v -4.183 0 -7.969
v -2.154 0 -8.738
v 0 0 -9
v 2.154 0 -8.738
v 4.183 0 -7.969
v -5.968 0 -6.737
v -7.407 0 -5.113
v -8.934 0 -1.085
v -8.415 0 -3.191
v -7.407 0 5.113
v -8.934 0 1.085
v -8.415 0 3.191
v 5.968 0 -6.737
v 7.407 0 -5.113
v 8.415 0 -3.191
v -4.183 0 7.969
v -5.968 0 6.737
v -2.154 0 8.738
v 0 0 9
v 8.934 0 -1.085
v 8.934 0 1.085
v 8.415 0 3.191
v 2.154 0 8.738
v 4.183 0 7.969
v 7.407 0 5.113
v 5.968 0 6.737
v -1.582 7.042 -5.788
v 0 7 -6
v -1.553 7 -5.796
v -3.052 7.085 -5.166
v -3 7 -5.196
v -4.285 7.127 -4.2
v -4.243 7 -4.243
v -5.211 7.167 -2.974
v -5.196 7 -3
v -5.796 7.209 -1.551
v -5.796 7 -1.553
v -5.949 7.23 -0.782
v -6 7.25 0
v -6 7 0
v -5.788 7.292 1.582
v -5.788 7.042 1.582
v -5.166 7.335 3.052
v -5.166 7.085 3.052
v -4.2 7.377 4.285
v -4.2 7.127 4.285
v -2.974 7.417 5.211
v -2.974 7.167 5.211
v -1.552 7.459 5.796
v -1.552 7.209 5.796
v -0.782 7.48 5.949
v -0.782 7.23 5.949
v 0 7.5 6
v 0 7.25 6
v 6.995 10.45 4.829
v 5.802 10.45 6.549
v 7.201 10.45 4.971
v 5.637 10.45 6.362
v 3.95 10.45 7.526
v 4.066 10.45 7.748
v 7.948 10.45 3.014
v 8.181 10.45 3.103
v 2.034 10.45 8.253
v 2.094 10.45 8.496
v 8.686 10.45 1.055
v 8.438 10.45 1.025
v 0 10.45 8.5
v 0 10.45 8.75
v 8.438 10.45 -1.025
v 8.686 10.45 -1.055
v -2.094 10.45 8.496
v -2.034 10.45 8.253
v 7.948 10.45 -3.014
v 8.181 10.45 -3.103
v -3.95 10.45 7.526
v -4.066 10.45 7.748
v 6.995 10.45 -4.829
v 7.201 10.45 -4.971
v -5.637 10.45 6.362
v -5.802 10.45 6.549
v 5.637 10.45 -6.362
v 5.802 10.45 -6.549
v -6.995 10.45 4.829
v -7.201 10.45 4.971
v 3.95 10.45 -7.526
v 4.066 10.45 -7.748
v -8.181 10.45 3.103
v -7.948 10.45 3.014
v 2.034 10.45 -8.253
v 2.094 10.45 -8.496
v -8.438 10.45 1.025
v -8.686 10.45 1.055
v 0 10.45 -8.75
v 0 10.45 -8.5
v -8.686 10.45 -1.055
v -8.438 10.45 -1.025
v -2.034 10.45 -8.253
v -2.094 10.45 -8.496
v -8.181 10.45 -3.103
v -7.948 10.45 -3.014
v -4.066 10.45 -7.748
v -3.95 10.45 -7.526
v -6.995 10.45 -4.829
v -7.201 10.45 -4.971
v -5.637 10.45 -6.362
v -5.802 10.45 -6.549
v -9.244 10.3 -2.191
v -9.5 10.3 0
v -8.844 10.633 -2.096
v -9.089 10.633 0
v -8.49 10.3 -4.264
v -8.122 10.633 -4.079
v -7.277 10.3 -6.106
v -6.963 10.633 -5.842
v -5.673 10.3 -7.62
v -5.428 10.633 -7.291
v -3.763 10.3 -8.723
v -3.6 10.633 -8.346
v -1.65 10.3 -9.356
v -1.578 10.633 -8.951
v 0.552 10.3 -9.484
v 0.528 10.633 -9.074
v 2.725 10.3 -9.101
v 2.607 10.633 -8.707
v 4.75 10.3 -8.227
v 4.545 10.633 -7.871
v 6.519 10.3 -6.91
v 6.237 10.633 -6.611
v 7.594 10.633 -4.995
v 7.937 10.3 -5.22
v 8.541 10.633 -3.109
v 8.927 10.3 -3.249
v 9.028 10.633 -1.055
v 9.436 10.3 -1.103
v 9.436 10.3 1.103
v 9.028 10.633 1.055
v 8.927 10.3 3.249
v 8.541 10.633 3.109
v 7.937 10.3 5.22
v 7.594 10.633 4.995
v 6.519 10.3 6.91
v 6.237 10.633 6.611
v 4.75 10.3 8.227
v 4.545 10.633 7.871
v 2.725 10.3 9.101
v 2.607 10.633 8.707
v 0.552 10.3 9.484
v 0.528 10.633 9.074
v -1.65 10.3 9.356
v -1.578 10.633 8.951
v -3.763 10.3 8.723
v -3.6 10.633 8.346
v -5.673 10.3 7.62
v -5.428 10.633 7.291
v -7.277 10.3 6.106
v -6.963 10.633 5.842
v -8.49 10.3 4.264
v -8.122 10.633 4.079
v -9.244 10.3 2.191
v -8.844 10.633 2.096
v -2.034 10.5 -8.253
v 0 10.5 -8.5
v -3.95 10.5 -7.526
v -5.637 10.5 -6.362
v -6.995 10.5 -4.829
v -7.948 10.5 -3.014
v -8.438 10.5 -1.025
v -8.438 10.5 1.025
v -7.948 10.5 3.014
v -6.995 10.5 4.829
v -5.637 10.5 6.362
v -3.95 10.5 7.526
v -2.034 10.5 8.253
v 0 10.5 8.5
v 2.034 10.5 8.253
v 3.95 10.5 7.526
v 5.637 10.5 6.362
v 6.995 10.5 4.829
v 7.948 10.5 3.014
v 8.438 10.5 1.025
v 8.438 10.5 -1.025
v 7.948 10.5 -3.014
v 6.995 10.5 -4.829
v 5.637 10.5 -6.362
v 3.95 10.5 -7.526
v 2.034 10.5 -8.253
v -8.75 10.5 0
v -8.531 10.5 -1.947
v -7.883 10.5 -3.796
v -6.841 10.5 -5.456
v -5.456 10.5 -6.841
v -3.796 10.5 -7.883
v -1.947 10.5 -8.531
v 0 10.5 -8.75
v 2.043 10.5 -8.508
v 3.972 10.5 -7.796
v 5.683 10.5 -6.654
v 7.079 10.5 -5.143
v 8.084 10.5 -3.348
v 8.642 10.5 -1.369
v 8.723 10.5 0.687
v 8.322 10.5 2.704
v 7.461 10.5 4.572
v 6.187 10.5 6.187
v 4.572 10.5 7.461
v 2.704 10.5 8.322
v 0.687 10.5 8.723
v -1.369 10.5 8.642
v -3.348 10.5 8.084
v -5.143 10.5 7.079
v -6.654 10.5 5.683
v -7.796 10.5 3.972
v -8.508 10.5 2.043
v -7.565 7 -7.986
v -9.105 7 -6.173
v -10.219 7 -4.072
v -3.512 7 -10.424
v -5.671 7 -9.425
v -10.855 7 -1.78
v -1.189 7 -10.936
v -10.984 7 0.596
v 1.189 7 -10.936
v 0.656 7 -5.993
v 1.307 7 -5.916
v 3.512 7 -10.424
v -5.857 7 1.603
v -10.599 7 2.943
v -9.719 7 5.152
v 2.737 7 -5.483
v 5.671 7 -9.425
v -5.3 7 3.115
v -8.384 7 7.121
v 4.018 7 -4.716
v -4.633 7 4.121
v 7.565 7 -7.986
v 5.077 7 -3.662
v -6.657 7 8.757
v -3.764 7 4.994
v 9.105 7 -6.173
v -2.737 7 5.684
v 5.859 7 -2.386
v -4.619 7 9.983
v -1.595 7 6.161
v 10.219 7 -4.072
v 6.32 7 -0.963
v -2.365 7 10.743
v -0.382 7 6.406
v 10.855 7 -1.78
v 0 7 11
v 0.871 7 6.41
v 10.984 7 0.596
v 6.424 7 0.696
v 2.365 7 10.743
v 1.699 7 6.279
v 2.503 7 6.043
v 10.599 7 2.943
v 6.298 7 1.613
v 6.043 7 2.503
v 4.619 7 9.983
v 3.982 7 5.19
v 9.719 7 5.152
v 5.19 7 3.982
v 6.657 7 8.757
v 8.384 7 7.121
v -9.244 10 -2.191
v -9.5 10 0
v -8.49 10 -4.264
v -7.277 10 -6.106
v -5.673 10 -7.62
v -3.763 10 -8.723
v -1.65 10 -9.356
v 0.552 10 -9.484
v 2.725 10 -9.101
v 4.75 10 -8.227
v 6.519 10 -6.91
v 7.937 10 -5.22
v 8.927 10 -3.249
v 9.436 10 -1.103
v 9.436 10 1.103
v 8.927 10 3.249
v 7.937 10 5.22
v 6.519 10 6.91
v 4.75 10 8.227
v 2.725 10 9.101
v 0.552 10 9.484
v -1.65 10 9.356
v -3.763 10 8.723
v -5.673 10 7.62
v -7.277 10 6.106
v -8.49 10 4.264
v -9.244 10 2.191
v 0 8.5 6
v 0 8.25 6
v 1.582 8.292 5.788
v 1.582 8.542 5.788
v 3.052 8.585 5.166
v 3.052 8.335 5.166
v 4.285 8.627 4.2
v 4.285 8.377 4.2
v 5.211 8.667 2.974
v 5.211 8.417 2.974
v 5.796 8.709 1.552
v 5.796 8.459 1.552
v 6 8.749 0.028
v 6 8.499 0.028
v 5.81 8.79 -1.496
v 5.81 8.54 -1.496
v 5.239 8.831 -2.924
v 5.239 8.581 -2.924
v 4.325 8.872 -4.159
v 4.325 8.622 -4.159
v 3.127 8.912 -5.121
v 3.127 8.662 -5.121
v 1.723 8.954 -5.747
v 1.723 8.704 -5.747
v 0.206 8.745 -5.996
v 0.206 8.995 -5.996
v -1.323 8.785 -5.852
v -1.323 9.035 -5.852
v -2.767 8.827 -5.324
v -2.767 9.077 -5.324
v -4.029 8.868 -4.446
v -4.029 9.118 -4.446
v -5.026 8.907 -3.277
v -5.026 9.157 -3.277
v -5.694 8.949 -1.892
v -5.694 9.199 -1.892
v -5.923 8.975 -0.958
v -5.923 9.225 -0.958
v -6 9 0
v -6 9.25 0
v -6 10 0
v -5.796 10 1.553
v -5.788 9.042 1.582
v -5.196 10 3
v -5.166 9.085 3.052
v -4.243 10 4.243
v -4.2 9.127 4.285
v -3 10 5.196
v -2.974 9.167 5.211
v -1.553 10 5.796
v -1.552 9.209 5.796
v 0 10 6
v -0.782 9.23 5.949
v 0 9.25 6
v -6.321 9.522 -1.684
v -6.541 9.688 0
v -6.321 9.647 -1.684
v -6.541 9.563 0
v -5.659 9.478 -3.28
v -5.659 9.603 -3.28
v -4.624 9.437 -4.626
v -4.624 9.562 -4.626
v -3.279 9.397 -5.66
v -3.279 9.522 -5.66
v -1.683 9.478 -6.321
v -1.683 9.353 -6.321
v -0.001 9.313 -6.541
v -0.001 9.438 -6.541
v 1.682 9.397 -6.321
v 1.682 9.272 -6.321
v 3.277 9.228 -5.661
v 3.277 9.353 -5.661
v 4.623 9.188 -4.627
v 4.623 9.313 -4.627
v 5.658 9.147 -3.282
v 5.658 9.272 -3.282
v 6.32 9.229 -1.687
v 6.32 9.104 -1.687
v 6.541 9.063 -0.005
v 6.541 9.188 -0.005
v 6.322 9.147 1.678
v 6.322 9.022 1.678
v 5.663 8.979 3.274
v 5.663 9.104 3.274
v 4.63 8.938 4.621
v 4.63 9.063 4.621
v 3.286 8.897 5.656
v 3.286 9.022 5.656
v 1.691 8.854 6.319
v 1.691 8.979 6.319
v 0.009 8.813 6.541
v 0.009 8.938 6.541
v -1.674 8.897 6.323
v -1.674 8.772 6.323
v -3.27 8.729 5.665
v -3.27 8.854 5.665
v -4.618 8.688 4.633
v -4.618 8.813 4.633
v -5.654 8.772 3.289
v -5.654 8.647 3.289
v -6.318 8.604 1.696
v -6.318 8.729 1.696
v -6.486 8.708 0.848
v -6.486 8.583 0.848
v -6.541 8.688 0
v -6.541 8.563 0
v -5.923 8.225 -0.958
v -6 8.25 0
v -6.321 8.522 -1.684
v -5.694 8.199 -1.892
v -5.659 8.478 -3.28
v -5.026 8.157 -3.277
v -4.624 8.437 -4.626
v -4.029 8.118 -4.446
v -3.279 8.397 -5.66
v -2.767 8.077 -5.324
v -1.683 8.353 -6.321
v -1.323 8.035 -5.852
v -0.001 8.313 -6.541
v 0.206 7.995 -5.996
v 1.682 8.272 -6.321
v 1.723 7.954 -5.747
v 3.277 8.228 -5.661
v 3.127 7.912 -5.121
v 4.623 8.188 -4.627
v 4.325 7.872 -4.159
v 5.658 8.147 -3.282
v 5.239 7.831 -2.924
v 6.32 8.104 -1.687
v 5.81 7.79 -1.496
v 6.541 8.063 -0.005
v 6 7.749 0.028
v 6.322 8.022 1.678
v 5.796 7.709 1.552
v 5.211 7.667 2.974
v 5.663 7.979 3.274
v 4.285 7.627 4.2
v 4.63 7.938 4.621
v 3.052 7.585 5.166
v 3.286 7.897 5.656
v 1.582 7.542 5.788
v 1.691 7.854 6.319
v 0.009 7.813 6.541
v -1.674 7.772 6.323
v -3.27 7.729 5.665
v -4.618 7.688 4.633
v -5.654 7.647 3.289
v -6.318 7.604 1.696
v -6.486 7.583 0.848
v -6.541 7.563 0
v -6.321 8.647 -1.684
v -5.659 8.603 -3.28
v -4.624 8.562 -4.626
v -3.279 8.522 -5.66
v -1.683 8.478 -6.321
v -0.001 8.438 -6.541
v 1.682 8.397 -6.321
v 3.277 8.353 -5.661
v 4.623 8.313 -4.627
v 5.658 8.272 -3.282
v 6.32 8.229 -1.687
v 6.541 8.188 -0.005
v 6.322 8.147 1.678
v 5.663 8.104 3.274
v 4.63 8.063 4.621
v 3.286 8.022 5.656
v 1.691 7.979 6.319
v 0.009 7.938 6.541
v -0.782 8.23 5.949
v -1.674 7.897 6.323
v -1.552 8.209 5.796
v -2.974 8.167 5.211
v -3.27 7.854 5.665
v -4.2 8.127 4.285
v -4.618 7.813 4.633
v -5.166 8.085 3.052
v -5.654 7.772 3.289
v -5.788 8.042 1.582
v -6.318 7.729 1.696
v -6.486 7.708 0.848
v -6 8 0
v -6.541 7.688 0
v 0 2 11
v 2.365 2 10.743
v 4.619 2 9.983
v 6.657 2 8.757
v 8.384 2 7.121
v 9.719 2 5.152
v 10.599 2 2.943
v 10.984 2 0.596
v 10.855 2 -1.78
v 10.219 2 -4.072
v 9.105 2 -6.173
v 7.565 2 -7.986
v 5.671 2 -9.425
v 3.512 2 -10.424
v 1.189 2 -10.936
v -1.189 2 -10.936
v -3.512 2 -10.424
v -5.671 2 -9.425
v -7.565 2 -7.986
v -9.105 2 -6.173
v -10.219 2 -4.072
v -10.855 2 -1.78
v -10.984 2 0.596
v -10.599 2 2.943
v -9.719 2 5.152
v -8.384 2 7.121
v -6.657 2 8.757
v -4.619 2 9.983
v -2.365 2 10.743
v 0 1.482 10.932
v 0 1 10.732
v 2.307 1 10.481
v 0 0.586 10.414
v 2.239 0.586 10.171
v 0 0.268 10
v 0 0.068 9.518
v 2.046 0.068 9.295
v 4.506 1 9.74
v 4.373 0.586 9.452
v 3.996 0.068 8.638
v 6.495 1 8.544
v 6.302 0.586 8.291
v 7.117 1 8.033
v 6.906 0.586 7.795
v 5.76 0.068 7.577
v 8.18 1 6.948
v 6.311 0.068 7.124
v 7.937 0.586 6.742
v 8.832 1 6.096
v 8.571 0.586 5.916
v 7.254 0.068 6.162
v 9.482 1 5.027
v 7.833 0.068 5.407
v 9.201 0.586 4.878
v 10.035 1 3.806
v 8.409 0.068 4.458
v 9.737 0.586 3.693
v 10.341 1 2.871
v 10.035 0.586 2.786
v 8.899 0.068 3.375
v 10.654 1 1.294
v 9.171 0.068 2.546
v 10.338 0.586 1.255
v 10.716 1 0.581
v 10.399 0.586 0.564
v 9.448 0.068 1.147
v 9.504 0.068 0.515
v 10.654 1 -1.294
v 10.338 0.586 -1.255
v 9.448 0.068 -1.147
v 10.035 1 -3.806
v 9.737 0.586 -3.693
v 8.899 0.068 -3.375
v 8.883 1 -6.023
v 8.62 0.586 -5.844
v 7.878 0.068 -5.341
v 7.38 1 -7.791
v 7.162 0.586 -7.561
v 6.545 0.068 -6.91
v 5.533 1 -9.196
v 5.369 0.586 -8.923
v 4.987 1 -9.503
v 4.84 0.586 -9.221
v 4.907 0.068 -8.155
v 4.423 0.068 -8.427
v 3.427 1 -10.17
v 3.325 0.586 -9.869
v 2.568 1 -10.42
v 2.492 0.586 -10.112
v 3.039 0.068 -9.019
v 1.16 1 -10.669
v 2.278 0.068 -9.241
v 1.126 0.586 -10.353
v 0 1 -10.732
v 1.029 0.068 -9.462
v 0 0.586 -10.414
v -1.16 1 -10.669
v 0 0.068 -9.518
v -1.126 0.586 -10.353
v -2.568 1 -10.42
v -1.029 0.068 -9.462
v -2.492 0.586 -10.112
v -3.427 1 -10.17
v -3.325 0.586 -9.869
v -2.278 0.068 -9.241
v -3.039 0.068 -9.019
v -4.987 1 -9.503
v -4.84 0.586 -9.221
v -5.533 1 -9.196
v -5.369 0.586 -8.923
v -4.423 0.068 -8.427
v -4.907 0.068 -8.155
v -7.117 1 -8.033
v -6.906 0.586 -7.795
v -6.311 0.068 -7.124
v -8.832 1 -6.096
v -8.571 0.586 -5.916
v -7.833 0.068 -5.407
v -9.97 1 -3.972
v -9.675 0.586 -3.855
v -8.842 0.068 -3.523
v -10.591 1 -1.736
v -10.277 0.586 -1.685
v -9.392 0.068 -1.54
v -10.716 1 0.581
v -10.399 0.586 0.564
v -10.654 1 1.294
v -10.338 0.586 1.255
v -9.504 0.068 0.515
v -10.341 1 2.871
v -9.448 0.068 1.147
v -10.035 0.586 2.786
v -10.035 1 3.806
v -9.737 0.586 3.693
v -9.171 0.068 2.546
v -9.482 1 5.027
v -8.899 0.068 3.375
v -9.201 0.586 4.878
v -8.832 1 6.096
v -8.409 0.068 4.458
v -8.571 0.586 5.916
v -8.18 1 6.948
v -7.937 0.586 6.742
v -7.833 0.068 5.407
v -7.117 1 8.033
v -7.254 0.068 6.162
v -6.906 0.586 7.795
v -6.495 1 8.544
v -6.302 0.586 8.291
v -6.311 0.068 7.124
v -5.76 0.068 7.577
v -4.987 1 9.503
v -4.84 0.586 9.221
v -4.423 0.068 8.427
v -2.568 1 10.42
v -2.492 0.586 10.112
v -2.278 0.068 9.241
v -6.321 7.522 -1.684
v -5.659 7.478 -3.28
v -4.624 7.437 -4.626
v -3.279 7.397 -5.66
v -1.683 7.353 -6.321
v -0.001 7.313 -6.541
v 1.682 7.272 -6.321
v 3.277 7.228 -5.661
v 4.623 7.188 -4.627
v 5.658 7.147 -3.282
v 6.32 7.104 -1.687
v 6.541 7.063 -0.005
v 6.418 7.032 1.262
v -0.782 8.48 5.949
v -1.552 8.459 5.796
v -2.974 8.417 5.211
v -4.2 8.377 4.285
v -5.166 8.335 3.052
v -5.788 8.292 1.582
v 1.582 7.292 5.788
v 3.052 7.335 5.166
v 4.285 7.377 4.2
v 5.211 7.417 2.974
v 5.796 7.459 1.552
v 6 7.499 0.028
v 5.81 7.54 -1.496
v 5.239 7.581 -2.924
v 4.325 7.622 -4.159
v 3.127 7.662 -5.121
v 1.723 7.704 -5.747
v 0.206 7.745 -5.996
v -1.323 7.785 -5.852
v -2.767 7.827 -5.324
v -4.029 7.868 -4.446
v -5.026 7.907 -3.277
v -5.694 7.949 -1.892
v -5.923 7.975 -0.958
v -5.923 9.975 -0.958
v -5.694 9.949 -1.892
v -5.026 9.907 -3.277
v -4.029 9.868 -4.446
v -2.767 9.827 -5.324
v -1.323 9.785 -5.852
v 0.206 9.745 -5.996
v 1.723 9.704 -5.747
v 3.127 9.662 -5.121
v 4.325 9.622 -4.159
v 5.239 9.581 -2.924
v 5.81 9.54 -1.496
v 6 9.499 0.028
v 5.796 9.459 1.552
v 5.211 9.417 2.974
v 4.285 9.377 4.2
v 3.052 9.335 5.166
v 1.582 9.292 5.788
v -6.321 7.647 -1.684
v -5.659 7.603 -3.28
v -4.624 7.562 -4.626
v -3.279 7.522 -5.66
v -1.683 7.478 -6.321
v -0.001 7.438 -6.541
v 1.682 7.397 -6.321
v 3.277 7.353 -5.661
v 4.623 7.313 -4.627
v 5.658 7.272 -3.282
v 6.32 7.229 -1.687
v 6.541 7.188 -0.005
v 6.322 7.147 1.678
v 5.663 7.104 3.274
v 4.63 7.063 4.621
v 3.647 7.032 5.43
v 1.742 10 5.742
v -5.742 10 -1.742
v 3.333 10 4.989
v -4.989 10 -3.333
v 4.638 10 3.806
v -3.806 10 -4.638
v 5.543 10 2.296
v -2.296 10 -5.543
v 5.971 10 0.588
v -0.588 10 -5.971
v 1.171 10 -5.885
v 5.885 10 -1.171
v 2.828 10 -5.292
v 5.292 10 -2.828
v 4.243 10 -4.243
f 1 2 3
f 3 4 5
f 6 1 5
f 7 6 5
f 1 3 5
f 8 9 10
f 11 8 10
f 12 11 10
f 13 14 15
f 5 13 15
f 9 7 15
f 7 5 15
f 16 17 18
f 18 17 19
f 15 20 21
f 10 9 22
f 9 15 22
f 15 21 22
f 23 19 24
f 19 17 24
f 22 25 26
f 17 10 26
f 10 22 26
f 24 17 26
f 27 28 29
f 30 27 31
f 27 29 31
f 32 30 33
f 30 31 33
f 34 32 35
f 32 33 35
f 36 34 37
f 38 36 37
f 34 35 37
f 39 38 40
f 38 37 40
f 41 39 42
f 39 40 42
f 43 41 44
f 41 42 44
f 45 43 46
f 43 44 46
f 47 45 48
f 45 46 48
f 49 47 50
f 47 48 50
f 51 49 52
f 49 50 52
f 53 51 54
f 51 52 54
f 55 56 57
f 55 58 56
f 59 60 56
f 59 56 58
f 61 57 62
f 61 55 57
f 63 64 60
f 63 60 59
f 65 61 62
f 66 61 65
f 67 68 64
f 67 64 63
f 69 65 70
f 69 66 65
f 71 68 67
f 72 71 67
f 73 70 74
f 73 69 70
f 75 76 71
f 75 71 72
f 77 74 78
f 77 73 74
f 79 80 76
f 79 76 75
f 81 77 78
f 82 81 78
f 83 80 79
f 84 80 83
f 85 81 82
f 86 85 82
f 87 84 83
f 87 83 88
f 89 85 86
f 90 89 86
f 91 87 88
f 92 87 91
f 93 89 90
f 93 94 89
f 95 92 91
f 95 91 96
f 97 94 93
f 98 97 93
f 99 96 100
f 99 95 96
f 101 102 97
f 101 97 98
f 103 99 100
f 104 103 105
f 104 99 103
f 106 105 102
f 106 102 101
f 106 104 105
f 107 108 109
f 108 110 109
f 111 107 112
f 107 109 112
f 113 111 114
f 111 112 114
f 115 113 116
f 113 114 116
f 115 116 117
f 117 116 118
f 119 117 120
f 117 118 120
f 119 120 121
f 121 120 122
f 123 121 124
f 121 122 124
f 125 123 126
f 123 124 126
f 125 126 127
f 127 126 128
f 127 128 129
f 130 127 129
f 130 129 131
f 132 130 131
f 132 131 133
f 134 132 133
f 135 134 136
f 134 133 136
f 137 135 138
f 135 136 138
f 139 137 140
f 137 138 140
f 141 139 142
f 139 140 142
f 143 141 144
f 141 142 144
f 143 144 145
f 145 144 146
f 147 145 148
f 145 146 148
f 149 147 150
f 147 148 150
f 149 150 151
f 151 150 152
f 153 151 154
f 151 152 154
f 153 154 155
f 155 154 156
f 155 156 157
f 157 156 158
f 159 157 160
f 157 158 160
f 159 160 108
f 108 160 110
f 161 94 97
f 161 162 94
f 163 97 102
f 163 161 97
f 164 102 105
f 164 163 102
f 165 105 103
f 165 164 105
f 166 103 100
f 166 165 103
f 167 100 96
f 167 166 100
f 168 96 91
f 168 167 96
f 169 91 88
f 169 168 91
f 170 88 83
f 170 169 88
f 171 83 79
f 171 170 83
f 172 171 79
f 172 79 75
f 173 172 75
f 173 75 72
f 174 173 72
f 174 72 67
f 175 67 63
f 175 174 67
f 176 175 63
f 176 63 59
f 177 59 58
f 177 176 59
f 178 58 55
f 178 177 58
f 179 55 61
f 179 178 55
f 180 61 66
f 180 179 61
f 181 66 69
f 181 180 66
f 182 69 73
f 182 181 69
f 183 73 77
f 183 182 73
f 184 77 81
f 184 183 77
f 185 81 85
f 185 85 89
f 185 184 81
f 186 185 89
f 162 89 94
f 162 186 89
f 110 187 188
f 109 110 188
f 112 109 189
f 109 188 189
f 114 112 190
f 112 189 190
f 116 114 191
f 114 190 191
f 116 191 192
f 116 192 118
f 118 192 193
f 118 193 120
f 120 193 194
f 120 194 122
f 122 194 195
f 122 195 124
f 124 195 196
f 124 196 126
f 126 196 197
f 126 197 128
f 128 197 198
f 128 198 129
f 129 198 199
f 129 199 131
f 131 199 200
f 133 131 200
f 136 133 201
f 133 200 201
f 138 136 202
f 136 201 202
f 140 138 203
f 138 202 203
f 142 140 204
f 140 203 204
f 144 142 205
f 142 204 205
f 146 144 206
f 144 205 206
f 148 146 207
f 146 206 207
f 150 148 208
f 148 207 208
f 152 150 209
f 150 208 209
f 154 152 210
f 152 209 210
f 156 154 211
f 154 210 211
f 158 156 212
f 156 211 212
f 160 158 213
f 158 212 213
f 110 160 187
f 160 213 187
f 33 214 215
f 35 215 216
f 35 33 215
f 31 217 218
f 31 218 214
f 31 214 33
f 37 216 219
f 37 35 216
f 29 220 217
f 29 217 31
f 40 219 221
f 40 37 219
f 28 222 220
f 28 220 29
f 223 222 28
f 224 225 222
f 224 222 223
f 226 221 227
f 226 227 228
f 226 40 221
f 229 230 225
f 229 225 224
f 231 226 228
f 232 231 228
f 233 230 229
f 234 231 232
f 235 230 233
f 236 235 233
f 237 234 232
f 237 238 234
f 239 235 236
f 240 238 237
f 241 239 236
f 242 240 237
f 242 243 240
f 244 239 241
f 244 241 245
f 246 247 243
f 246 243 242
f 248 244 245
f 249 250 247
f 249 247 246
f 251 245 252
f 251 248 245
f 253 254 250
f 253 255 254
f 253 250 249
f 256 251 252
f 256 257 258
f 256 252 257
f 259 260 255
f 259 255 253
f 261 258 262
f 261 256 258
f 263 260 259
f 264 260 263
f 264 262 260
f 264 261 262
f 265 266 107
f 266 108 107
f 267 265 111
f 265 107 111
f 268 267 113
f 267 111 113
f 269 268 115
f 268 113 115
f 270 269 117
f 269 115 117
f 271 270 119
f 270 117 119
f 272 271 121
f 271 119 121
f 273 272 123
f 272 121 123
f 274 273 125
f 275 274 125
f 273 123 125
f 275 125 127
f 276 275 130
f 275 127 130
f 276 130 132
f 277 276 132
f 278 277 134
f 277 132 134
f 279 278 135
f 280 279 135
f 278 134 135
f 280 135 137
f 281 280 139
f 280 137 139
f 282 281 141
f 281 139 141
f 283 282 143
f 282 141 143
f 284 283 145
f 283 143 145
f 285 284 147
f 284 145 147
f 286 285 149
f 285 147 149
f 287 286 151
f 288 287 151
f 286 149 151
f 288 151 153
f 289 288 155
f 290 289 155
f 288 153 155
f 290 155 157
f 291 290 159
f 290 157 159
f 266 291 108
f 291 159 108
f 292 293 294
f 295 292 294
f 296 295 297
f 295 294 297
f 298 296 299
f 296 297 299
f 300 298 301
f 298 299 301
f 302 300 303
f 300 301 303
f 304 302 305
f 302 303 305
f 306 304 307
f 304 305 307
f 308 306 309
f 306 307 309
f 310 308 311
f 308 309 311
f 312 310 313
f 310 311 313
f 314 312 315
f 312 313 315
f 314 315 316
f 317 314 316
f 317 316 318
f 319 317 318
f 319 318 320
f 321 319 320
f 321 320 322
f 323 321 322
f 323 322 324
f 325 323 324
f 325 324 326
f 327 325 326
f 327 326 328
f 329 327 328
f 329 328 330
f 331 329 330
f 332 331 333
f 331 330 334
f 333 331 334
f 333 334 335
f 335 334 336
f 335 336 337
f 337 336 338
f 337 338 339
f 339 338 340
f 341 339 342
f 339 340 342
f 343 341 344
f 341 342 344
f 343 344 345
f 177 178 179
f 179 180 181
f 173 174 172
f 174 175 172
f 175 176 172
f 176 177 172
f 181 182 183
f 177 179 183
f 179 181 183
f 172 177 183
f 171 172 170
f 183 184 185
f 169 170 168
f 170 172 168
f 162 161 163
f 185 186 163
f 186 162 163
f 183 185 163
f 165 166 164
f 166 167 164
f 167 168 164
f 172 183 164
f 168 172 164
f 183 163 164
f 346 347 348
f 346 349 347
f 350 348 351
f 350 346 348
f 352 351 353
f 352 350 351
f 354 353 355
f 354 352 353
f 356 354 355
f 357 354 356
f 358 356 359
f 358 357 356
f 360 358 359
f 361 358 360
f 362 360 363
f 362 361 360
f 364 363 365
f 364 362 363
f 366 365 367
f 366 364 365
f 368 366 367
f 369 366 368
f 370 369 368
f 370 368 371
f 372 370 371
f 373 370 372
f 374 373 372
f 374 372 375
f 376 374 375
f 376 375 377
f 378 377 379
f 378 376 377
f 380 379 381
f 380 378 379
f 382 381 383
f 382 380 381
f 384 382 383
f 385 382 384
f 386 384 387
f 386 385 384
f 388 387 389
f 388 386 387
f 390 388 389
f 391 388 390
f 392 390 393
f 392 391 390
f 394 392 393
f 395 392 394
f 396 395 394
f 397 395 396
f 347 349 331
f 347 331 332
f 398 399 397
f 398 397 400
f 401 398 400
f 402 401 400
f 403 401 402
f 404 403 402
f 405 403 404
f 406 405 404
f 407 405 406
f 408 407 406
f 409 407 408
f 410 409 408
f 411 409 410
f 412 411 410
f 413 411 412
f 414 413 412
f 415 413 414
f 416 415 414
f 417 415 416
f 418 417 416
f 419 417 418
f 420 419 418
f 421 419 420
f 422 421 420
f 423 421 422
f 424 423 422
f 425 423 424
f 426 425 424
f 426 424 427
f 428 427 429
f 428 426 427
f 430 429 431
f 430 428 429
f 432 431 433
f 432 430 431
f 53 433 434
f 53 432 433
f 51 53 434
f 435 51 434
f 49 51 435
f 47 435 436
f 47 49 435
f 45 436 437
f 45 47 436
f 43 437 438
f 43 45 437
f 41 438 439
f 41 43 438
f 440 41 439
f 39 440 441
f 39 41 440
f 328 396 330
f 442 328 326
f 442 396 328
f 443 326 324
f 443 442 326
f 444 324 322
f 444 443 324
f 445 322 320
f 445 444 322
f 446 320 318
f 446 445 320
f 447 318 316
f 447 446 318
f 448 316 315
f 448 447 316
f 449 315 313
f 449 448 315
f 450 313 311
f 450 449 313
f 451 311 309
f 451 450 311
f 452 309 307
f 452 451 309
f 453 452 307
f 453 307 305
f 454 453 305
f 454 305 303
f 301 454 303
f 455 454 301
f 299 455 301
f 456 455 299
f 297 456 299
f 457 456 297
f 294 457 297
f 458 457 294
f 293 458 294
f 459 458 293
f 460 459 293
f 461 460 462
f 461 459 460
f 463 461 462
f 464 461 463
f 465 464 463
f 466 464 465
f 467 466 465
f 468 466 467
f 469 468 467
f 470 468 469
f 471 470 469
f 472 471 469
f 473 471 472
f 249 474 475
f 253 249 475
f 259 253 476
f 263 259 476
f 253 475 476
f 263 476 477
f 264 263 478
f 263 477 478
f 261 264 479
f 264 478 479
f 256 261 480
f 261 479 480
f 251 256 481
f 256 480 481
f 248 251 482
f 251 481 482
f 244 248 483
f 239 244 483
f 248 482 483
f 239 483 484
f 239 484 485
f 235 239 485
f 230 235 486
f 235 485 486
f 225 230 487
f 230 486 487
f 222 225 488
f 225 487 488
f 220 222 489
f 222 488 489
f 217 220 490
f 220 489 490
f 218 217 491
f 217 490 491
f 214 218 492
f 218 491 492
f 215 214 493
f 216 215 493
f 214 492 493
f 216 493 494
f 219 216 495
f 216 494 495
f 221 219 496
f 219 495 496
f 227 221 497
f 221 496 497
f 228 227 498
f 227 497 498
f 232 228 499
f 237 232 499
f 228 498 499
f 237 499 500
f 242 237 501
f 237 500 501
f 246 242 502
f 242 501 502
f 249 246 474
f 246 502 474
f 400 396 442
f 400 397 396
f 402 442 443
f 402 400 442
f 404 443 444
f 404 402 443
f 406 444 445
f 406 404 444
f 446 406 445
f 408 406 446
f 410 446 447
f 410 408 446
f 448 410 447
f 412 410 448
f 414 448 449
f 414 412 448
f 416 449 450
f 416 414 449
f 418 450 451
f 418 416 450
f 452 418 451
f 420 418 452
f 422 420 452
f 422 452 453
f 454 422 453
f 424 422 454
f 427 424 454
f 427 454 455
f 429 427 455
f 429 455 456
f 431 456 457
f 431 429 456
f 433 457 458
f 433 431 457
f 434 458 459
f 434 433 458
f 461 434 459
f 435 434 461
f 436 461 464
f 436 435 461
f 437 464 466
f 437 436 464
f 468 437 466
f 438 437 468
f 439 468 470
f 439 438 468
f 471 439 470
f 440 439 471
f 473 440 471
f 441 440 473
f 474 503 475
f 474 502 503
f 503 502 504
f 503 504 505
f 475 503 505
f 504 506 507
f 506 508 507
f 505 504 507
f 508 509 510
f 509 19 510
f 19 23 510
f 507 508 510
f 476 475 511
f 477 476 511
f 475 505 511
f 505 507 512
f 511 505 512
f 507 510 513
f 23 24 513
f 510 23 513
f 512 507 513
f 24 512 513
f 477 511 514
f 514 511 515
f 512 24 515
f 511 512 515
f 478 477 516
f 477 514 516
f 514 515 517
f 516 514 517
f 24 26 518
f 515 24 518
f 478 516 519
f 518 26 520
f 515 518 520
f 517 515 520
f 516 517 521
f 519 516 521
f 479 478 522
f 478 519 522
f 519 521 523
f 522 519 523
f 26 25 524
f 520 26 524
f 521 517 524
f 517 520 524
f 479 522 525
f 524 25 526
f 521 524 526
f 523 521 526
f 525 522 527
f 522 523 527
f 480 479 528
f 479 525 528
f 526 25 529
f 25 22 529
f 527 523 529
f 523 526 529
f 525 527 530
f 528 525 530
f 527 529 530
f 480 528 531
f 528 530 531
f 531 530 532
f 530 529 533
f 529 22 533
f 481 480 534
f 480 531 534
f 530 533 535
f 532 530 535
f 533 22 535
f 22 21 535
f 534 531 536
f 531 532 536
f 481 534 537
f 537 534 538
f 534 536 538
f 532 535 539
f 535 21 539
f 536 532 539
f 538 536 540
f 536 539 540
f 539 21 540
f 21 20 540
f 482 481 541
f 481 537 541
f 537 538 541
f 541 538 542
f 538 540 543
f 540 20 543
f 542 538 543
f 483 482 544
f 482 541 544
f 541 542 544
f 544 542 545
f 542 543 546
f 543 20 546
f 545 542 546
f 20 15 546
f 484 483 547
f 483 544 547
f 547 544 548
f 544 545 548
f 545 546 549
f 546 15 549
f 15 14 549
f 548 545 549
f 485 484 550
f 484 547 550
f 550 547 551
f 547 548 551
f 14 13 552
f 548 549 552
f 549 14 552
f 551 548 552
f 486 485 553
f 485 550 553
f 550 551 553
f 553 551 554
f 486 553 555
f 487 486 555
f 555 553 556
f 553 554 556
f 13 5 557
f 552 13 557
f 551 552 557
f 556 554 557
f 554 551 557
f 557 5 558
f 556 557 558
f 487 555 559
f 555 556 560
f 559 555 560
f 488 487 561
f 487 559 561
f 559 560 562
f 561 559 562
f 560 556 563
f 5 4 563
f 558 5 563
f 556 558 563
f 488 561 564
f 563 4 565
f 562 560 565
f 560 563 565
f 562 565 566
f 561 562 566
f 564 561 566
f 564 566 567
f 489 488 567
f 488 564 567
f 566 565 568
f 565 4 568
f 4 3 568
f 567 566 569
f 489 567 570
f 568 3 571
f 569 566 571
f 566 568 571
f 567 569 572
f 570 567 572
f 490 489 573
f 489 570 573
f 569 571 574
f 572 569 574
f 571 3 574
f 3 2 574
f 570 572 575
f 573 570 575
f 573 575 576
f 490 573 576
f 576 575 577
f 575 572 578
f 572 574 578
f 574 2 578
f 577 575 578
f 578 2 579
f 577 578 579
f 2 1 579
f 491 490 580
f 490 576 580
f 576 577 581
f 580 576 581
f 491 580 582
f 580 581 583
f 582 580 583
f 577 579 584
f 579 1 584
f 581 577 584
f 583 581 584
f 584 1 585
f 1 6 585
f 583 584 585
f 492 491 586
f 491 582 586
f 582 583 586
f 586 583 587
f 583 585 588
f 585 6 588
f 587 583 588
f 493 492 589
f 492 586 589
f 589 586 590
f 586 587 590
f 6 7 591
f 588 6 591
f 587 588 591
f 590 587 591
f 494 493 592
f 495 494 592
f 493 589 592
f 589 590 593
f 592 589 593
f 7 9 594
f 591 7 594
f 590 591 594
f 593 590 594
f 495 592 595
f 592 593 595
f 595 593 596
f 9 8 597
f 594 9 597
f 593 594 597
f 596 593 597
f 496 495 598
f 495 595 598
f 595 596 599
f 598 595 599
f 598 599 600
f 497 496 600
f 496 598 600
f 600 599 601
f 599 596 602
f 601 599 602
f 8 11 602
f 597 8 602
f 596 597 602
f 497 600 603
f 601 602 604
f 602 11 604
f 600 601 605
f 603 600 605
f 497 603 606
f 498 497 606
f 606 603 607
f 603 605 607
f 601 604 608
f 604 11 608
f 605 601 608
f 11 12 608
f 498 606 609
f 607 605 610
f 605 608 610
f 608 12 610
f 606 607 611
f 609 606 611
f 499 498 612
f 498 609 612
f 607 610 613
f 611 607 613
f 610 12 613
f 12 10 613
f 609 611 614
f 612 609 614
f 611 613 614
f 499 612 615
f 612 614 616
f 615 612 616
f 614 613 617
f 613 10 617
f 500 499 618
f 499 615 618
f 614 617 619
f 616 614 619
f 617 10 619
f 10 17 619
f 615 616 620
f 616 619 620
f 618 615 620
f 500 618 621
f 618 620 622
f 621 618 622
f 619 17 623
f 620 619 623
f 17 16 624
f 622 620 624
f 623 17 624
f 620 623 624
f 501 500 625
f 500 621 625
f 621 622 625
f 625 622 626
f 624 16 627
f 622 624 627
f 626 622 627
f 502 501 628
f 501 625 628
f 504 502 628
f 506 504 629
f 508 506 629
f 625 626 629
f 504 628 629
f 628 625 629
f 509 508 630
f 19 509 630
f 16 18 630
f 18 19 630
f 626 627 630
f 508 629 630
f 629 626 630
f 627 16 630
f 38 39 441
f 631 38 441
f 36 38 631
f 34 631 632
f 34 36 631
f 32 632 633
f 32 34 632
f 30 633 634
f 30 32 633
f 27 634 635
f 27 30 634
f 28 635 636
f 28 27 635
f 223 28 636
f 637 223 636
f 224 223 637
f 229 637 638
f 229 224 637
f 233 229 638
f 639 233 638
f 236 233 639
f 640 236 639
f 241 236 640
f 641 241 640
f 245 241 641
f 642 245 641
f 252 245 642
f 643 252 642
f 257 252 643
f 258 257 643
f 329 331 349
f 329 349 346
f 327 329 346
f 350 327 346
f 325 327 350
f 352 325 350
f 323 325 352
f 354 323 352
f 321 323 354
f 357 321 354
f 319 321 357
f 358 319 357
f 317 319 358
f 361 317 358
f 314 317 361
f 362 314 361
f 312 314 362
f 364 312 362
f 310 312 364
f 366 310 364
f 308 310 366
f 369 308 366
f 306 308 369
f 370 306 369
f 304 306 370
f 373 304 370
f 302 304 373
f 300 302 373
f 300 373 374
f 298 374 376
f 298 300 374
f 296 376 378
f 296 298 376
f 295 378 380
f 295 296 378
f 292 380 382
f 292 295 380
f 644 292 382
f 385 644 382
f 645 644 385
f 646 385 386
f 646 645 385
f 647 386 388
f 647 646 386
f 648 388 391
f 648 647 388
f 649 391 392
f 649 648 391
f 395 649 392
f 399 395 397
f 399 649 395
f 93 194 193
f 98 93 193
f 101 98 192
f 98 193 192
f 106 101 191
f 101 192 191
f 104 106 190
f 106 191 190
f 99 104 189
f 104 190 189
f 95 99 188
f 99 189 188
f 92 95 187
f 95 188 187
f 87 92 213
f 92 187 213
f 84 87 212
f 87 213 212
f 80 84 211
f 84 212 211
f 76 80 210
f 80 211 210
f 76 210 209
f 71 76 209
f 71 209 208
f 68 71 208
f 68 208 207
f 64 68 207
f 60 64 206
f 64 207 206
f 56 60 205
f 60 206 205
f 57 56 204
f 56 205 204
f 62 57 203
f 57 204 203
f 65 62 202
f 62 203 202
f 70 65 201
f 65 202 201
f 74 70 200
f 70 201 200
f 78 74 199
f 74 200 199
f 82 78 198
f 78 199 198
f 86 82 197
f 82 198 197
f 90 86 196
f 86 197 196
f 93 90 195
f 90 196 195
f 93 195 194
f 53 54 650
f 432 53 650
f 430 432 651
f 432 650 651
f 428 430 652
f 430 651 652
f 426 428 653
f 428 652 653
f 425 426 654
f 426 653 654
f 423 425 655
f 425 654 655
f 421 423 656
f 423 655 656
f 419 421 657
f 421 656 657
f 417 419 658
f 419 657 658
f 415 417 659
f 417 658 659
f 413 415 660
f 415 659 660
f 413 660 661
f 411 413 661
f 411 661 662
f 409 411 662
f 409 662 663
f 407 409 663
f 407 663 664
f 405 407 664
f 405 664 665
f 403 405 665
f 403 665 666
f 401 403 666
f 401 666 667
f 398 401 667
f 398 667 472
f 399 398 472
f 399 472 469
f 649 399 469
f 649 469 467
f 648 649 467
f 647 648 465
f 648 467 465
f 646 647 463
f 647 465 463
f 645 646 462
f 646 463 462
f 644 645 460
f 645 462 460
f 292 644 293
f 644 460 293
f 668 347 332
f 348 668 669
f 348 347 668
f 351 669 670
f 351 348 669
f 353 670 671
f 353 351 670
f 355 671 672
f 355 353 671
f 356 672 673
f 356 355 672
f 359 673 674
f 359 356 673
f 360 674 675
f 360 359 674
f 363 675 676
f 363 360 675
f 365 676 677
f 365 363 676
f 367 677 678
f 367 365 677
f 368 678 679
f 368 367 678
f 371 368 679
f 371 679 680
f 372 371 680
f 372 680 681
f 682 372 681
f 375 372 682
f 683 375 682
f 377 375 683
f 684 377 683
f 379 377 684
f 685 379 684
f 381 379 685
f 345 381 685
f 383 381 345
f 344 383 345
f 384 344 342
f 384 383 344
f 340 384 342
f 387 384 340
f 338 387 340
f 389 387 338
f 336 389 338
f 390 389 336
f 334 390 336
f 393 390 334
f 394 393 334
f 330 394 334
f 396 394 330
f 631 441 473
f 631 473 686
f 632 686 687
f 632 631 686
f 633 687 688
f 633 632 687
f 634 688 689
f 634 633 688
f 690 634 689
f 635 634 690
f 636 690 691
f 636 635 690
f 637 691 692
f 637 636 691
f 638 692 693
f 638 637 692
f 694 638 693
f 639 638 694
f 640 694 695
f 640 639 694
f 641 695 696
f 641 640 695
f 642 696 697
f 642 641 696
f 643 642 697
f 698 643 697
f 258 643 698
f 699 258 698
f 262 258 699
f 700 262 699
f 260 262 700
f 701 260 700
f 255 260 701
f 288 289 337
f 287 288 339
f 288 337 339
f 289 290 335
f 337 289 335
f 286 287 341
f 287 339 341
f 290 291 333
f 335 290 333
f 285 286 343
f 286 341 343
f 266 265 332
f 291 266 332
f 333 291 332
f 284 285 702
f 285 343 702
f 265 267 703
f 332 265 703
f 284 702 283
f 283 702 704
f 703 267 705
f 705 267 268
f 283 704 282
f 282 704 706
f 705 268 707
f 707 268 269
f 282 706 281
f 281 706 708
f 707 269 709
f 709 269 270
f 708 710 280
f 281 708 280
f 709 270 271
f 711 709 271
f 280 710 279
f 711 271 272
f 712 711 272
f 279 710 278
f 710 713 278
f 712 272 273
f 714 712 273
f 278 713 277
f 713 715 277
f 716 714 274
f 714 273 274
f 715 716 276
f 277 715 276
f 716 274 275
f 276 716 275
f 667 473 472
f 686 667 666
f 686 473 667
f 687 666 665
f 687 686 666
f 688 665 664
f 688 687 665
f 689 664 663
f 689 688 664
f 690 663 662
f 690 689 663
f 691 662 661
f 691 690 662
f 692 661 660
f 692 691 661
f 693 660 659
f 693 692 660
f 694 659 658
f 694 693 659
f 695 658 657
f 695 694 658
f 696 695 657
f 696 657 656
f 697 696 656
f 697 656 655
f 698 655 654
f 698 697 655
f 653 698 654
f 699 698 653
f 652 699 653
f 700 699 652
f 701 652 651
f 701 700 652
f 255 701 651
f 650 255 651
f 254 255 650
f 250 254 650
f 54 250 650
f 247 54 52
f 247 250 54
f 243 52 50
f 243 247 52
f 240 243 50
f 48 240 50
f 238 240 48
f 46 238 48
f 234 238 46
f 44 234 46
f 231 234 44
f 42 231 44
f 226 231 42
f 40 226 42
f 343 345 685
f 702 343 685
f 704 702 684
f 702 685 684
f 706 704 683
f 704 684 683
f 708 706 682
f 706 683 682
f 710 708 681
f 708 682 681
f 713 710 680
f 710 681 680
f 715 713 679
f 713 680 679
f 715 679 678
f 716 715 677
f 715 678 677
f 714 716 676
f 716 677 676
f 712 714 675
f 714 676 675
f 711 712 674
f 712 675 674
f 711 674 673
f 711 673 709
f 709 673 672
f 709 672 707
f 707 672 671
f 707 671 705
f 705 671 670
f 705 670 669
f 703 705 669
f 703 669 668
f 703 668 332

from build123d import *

# Parameters (mm, degrees)
SKETCH_1_R      = 11
EXTRUDE_1_DEPTH = 7
SKETCH_2_R      = 6
EXTRUDE_2_DEPTH = 3
FILLET_1_R      = 2
THREAD_1_PITCH  = 1
SKETCH_9_W      = 0.25
SKETCH_9_H      = 0.05


with BuildPart() as part:
    # Sketch 1 → 凸台-拉伸1 (new body)
    with BuildSketch(Plane(origin=(0, 0, 0), x_dir=(1, 0, 0), z_dir=(0, 1, 0))):
        with Locations(Location((0, 0, 0), (0, 0, 270))):
            Circle(SKETCH_1_R)
    extrude(amount=EXTRUDE_1_DEPTH)

    # 草图2 → 凸台-拉伸2 (add)
    with BuildSketch(Plane(origin=(0, 7, 0), x_dir=(1, 0, 0), z_dir=(0, 1, 0))):
        with Locations(Location((0, 0, 0), (0, 0, 270))):
            Circle(SKETCH_2_R)
    extrude(amount=EXTRUDE_2_DEPTH)

    # 圆角1
    fillet_1_edges = [part.edges().sort_by_distance(p)[0] for p in [
        (0, 0, -11),
    ]]
    fillet(fillet_1_edges, radius=FILLET_1_R)

    # 螺纹线1: the profile of Sketch 1 2 profile screwed along a right-hand helix of 3 turns, 8 arcs to a turn; built about Z, then put on its axis
    thread_1_z = Axis((0, 0, 0), (0, 0, 1))
    thread_1_corners = [(5.9997, 0, -0.000173205), (6.541265875, 0, 0.312499999), (6.541265875, 0, 0.437499999), (5.9997, 0, 0.750173202)]
    with BuildLine(mode=Mode.PRIVATE) as thread_1_profile:
        Line(thread_1_corners[0], thread_1_corners[1])
        Line(thread_1_corners[1], thread_1_corners[2])
        Line(thread_1_corners[2], thread_1_corners[3])
        Line(thread_1_corners[3], thread_1_corners[0])
    thread_1_cap = Face(thread_1_profile.wire())
    thread_1_turn_angles = [0, 22.5, 45, 67.5, 90, 112.5, 135, 157.5, 180, 202.5, 225, 247.5, 270, 292.5, 315, 337.5, 360]
    thread_1_turn_weights = [1, 0.9238795325112867, 1, 0.9238795325112867, 1, 0.9238795325112867, 1, 0.9238795325112867, 1, 0.9238795325112867, 1, 0.9238795325112867, 1, 0.9238795325112867, 1, 0.9238795325112867, 1]
    thread_1_turn_rails = [Edge.make_bspline([Vector(p[0], p[1], 0).rotate(thread_1_z, thread_1_turn_angles[k]) / thread_1_turn_weights[k] + Vector(0, 0, p[2] + THREAD_1_PITCH * thread_1_turn_angles[k] / 360) for k in range(17)], [0, 0, 0, 1, 1, 2, 2, 3, 3, 4, 4, 5, 5, 6, 6, 7, 7, 8, 8, 8], 2, thread_1_turn_weights) for p in thread_1_corners]
    thread_1_turn_sides = [Face.make_surface_from_curves(thread_1_turn_rails[p[0]], thread_1_turn_rails[p[1]]) for p in [(0, 1), (1, 2), (2, 3), (3, 0)]]
    thread_1 = Plane(origin=(0, 10, 0), x_dir=(-1, 0, 0), z_dir=(0, -1, 0)) * Solid(Shell([*[p.moved(Location((0, 0, THREAD_1_PITCH * i))) for i in range(3) for p in thread_1_turn_sides], thread_1_cap, thread_1_cap.rotate(thread_1_z, 1080).moved(Location((0, 0, THREAD_1_PITCH * 1080 / 360)))]))
    add(thread_1)

    # 草图7 → 旋转1 (revolve)
    with BuildSketch(Plane.XY):
        Polygon((0, 10), (-9.5, 10), (-9.5, 10.3), (-9.089054213, 10.632548824), (-8.75, 10.5), (0, 10.5), align=None)
    revolve(axis=Axis((0, 10.5, 0), (0, -1, 0)))

    # 草图9 → 切除-旋转1 (revolve, cut)
    with BuildSketch(Plane.XY, mode=Mode.PRIVATE) as cut_revolve_1_sk:
        with Locations((-8.625, 10.475)):
            Rectangle(SKETCH_9_W, SKETCH_9_H)
    revolve(cut_revolve_1_sk.sketch.rotate(Axis((0, -0.995458227, 0), (0, 1, 0)), 270), axis=Axis((0, -0.995458227, 0), (0, 1, 0)), mode=Mode.SUBTRACT)


solid = part.part
